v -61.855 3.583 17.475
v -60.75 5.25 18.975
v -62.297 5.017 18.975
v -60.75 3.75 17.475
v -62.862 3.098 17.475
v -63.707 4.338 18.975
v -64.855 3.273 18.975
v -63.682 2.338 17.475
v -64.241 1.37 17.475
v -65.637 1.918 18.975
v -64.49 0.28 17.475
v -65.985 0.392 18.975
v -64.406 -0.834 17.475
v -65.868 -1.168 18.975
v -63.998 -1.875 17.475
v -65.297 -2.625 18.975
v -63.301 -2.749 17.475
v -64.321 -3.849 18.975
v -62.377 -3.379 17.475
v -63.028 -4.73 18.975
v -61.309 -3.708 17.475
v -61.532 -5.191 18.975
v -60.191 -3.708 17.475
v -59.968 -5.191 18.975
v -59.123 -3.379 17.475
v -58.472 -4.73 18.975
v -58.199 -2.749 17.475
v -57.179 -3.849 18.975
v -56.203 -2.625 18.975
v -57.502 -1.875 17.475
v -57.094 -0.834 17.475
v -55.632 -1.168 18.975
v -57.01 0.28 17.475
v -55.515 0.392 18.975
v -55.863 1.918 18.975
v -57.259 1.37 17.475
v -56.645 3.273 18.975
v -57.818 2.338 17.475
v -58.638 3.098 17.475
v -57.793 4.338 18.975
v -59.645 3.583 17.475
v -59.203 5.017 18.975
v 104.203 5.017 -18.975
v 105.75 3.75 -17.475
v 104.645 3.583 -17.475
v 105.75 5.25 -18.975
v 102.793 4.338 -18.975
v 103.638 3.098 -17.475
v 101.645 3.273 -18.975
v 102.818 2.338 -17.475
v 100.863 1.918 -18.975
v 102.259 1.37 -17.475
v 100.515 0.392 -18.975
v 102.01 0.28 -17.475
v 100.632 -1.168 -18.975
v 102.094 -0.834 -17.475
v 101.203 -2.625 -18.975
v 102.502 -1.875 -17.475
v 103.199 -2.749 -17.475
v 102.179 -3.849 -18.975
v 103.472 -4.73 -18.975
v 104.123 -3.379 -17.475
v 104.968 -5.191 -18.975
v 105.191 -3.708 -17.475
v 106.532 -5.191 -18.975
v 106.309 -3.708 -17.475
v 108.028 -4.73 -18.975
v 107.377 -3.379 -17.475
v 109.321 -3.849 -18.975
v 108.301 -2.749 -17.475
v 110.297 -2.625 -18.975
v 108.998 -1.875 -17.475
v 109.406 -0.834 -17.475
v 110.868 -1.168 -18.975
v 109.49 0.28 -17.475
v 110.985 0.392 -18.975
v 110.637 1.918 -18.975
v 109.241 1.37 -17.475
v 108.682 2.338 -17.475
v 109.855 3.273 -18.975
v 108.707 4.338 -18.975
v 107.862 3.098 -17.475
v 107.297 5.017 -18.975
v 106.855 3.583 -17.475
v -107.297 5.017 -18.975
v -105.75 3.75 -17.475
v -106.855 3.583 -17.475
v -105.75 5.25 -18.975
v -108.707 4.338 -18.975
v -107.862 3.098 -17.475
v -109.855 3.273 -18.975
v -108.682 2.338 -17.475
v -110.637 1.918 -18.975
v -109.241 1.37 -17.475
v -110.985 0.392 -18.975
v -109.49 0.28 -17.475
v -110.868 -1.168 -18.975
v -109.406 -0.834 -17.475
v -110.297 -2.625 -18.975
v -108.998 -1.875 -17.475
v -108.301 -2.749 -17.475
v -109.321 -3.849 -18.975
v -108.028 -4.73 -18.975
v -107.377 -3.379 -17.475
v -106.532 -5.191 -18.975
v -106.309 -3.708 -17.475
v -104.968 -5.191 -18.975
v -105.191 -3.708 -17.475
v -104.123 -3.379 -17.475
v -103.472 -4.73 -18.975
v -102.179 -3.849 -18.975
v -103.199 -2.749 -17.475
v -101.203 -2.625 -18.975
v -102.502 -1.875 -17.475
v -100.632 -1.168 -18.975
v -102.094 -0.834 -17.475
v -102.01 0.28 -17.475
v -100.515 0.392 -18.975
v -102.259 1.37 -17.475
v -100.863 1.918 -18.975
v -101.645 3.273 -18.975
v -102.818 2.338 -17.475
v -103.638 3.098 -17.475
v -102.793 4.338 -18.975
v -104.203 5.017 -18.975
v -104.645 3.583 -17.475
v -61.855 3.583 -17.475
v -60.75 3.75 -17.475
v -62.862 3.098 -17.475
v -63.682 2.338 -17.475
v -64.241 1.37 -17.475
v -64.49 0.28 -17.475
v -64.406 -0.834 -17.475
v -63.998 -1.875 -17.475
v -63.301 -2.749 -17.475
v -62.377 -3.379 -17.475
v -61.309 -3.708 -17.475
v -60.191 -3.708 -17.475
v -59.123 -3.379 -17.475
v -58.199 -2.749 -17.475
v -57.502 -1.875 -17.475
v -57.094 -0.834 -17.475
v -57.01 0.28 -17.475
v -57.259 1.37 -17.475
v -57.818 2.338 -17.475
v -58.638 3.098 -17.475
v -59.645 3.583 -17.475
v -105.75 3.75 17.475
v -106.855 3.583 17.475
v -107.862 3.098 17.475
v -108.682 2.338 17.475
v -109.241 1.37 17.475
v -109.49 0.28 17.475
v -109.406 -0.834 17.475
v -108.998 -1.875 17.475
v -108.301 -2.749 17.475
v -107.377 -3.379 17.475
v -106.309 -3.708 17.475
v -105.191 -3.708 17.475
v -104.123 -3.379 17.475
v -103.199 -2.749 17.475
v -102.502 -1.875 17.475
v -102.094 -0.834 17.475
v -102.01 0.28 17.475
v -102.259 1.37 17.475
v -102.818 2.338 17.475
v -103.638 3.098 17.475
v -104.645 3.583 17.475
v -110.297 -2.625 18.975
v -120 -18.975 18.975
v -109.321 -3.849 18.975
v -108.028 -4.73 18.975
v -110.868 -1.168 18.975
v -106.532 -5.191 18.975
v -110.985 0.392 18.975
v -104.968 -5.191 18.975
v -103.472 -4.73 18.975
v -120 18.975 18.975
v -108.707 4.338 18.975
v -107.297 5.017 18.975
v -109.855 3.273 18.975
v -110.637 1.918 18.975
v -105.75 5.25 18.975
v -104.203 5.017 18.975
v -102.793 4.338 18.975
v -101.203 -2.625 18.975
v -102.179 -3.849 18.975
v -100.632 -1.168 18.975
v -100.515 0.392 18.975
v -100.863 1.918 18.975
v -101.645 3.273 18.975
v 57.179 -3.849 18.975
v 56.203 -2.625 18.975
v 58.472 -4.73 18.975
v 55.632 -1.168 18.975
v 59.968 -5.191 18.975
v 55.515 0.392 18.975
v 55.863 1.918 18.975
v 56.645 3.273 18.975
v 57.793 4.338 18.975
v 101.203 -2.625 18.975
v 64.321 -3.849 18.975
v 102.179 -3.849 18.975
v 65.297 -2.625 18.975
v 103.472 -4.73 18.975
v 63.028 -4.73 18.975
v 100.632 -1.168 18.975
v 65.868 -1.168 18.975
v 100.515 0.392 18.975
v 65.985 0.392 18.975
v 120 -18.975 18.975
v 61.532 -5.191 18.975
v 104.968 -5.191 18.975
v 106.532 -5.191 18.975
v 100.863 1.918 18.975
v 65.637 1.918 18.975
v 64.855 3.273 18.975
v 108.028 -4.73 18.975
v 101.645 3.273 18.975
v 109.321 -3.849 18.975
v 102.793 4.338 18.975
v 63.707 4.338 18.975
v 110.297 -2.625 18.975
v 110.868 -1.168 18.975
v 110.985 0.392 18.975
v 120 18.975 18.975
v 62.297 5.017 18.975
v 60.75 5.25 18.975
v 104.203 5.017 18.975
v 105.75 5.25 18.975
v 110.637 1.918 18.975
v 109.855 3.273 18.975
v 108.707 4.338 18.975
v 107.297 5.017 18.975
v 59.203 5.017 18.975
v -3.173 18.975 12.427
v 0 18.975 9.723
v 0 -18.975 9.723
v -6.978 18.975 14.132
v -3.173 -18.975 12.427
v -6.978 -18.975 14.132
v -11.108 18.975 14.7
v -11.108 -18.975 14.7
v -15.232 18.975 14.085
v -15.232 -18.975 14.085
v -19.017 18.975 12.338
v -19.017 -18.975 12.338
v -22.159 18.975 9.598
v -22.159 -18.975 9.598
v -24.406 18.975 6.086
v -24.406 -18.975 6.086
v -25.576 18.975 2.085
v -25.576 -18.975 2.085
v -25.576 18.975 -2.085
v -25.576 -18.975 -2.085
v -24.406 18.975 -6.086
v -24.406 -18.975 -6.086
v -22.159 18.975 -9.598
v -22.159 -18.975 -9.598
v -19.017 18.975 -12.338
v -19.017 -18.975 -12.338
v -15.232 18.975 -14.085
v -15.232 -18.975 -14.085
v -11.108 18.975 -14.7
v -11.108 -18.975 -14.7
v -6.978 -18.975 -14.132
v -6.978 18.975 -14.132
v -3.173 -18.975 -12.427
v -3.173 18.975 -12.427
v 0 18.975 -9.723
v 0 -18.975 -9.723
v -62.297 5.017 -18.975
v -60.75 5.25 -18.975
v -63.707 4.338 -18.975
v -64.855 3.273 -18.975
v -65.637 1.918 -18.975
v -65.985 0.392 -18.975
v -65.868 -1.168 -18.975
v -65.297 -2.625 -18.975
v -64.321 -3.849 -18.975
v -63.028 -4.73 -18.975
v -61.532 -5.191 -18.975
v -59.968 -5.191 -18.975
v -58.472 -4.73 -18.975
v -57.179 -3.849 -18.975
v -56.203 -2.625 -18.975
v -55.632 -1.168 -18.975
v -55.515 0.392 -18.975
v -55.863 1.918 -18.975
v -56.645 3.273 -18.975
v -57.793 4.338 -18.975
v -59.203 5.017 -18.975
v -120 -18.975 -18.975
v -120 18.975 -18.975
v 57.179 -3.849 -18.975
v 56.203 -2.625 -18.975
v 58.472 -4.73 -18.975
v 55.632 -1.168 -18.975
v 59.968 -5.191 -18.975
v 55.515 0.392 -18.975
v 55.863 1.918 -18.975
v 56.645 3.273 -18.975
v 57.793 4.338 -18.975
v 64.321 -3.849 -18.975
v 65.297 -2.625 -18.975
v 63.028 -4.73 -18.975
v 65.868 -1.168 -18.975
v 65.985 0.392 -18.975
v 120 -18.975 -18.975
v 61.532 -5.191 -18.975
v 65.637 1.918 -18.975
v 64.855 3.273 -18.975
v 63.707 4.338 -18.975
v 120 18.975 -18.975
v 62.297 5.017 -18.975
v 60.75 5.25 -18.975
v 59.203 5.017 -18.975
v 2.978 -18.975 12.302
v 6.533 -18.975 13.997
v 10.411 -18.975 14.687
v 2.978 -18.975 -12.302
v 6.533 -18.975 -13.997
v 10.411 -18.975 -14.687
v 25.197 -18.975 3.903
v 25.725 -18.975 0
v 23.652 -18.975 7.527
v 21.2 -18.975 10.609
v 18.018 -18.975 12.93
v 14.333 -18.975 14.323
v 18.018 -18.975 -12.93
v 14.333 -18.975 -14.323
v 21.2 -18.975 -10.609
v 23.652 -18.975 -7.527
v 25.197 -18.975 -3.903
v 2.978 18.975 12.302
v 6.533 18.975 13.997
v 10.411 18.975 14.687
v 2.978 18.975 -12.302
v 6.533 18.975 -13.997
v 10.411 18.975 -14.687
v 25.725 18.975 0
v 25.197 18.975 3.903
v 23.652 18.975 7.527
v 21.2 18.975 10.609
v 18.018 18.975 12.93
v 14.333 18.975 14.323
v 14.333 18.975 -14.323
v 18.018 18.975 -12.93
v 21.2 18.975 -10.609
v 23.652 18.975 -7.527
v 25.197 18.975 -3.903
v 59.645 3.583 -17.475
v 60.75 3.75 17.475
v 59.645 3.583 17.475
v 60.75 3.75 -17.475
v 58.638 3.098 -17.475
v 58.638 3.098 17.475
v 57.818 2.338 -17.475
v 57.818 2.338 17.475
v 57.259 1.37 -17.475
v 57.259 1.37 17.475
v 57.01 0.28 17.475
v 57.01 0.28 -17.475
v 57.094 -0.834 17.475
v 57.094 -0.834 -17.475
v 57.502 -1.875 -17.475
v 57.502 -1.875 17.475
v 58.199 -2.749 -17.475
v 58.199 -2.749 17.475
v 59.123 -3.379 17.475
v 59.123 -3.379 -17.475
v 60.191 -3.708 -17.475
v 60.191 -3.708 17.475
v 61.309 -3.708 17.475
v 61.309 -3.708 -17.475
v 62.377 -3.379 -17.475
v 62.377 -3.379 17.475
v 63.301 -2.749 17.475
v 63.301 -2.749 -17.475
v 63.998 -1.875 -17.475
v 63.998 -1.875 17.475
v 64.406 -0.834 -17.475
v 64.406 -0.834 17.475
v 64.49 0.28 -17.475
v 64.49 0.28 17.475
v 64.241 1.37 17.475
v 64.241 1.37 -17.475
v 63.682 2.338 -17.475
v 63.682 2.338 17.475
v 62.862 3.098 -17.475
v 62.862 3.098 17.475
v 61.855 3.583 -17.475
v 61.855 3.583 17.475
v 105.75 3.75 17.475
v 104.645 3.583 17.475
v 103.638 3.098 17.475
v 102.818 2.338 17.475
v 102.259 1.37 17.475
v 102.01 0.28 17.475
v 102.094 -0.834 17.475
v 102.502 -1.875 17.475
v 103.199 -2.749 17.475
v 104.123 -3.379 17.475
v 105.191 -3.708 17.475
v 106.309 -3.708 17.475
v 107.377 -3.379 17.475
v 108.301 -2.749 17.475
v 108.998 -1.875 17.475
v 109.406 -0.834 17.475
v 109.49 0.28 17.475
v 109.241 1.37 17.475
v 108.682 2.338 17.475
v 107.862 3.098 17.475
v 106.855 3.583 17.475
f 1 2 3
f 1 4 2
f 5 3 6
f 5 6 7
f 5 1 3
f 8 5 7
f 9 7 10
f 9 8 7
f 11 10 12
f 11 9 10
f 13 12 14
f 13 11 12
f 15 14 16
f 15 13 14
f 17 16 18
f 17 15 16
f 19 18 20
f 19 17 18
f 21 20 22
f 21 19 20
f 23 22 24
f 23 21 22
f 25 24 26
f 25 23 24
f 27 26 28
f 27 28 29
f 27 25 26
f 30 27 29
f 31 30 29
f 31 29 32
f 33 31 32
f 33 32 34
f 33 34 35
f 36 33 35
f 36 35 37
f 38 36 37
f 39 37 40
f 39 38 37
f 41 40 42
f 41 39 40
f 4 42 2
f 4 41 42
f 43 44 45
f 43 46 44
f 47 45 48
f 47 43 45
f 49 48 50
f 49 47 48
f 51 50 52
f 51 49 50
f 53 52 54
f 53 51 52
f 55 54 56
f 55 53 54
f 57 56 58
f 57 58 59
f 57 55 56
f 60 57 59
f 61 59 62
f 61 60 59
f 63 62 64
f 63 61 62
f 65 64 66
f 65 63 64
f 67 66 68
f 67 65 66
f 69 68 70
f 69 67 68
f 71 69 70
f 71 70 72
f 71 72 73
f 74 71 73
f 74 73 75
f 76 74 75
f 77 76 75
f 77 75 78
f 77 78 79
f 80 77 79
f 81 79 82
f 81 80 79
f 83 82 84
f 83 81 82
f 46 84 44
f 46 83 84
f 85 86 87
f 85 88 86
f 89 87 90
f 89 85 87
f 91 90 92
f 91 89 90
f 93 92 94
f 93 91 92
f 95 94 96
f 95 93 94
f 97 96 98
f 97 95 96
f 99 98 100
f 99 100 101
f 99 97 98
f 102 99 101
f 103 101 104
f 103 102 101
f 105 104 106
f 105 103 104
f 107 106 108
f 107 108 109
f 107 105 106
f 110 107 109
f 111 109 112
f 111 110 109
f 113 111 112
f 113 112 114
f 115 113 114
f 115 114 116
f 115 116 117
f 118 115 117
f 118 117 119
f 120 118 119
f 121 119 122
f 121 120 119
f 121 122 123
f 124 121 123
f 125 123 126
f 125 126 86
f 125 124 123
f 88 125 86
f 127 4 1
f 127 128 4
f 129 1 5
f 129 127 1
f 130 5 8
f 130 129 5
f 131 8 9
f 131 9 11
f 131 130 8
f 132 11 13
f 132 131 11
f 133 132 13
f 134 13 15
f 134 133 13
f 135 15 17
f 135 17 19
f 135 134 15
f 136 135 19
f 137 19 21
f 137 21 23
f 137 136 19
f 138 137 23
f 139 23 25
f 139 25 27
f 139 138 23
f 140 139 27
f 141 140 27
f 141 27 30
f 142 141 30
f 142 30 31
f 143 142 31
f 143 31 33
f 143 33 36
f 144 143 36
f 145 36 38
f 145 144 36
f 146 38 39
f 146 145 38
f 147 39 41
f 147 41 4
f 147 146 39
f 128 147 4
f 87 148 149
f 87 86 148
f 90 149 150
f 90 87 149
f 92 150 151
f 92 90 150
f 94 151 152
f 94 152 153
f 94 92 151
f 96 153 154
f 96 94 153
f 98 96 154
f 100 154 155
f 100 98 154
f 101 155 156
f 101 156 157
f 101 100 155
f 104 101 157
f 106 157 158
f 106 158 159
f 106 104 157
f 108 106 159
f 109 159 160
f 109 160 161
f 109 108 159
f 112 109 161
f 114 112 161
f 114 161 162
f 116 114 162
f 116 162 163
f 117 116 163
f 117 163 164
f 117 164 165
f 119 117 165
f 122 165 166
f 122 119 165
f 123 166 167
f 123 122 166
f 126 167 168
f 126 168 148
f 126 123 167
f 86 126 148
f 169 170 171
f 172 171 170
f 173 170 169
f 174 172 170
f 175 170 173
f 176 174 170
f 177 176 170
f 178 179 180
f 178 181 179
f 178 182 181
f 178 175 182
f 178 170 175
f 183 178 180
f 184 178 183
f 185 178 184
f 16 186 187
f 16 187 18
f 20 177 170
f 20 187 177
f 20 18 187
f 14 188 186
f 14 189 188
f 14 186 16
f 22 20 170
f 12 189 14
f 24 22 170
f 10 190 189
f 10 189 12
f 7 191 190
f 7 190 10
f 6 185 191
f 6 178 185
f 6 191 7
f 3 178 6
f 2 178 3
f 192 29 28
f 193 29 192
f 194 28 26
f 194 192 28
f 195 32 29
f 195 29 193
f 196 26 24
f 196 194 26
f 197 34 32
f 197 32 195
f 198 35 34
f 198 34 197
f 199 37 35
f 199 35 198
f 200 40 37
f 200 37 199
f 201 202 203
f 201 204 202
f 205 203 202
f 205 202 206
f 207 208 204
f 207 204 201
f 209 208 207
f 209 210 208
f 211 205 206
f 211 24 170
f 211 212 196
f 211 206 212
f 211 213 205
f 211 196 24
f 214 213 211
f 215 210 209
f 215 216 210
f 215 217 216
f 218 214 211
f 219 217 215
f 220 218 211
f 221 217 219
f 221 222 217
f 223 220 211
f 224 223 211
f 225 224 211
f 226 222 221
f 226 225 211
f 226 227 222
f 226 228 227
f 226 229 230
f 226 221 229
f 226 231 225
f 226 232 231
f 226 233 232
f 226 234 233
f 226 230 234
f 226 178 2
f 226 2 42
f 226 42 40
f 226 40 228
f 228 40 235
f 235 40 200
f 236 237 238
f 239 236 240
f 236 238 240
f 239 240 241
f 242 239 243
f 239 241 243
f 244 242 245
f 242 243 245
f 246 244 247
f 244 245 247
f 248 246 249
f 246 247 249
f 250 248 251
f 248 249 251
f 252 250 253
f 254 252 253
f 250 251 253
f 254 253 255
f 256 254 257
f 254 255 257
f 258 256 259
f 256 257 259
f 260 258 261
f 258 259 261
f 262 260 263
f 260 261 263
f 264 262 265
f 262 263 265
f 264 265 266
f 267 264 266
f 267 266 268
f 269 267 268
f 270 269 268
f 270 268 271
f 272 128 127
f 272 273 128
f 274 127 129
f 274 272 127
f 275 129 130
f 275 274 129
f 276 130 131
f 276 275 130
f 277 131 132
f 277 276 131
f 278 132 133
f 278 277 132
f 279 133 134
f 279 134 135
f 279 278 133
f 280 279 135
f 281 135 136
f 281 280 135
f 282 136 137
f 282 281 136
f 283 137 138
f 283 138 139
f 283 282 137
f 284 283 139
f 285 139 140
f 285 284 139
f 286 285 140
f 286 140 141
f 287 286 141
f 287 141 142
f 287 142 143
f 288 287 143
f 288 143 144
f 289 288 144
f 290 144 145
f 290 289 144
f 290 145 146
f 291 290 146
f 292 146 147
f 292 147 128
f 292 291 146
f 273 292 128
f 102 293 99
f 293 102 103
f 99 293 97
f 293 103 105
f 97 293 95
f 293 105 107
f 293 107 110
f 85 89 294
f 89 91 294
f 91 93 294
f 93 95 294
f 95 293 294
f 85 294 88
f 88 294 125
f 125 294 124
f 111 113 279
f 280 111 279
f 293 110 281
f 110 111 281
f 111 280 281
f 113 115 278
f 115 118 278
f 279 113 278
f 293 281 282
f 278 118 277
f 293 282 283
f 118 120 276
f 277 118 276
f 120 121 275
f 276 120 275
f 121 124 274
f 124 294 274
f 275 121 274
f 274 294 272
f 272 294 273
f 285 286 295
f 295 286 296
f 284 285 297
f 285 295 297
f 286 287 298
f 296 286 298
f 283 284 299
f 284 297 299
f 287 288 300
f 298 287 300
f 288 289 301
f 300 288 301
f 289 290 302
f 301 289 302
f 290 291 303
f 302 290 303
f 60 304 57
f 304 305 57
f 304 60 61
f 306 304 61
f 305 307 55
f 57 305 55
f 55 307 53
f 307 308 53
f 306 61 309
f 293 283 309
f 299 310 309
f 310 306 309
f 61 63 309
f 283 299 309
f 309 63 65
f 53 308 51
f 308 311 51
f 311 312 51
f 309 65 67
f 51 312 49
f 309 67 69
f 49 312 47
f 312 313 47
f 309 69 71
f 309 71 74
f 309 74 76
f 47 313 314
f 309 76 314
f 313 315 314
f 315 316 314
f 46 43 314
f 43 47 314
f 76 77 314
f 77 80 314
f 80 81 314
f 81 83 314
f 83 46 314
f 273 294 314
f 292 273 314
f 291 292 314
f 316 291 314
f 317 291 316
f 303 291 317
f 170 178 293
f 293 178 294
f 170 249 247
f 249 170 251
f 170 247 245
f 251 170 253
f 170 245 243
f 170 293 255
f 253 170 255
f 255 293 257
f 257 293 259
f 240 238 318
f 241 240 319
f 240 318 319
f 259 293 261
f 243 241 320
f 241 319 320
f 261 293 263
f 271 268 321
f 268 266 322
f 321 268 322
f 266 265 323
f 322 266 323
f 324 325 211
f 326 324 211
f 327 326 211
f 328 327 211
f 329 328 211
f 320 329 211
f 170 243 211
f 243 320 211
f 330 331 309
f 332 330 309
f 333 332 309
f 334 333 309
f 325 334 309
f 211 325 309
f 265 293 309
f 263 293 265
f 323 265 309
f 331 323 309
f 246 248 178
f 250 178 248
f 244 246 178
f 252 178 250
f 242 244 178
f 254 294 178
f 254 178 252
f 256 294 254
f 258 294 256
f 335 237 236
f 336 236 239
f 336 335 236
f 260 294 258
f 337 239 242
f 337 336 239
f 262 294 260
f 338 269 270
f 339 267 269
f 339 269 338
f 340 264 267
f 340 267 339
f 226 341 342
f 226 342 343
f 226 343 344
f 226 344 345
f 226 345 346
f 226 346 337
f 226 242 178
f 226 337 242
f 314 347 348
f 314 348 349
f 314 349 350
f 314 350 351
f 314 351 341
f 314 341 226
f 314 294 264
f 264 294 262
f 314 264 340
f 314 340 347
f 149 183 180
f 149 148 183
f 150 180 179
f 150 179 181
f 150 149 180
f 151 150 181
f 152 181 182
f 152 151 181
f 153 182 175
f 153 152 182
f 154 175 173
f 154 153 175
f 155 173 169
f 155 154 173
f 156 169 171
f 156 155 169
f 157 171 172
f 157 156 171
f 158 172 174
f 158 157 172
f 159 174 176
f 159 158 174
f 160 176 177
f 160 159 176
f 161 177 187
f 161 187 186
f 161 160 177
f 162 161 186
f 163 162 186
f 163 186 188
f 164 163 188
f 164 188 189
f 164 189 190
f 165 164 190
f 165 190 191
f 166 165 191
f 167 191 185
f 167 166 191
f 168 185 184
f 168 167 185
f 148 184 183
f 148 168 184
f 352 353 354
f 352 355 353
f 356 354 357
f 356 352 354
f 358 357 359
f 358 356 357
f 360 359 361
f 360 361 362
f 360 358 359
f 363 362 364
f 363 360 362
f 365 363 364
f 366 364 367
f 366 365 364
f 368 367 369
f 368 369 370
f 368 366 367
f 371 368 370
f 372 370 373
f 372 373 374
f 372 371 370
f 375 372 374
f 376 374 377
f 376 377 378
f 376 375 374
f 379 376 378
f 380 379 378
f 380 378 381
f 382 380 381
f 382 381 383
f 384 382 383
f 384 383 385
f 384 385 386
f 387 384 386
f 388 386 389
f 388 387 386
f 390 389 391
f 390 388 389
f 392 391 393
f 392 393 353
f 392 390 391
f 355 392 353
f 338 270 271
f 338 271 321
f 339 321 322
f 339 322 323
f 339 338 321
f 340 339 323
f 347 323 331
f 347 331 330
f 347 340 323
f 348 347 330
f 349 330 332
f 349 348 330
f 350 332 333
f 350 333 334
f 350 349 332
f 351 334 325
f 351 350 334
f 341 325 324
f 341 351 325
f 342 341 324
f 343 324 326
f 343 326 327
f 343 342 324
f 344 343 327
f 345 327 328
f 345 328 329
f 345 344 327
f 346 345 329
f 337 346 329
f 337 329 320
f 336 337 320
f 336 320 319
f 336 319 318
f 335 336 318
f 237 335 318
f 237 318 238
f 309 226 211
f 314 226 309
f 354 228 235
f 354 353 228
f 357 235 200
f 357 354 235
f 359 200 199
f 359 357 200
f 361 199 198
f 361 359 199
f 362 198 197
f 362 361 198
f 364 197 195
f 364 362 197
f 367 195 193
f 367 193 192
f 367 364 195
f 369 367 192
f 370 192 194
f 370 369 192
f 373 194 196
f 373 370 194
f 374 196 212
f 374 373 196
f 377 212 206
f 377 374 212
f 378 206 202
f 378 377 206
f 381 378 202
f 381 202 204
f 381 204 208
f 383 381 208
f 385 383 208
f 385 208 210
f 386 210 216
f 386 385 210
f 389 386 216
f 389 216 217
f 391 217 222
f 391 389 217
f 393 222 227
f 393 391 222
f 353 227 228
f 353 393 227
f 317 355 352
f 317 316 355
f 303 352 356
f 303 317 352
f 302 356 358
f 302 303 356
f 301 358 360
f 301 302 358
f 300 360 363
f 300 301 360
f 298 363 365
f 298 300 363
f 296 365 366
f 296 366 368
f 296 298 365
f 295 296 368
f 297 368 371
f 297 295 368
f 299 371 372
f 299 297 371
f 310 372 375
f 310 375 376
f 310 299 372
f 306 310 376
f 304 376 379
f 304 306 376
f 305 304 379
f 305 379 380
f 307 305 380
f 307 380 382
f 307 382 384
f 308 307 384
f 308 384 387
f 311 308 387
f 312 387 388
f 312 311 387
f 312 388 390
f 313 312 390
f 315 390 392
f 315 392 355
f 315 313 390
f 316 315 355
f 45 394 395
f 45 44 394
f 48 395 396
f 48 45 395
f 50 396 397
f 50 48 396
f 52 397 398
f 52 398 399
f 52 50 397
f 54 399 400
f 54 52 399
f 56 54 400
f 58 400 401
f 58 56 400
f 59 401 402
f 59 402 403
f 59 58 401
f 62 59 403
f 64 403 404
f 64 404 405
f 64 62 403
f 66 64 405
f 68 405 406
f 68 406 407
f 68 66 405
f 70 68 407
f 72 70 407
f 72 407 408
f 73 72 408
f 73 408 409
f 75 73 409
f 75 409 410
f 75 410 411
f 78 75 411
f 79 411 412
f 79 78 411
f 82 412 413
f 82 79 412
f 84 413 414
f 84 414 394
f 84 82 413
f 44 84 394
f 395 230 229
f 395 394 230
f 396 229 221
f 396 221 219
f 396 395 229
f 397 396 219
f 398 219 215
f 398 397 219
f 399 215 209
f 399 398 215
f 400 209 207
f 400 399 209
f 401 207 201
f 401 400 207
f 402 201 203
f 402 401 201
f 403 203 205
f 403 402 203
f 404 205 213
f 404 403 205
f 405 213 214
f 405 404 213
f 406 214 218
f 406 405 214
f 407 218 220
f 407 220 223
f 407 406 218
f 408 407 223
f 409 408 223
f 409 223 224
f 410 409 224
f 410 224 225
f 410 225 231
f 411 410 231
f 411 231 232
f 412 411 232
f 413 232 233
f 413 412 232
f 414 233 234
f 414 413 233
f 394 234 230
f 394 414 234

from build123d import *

# Parameters (mm, degrees)
SKETCH1_W                  = 80
SKETCH1_H                  = 12.65
BOSS_EXTRUDE1_DEPTH        = 6.325
M3_TAPPED_HOLE1_AT_2_COUNT = 2
M3_TAPPED_HOLE1_AT_2_PITCH = 15
M3_TAPPED_HOLE1_AT_3_COUNT = 2
M3_TAPPED_HOLE1_AT_3_PITCH = 55.5
M3_TAPPED_HOLE1_AT_4_COUNT = 2
M3_TAPPED_HOLE1_AT_4_PITCH = 70.5
SCALE1_SCALE               = 3


with BuildPart() as part:
    # Sketch1 → Boss-Extrude1 (new, symmetric)
    with BuildSketch(Plane(origin=(0, 0, 0), x_dir=(1, 0, 0), z_dir=(0, 1, 0))):
        Rectangle(SKETCH1_W, SKETCH1_H)
        with BuildLine():
            ThreePointArc((0, -3.241045356), (-8.575, 0), (0, 3.241045356))
            ThreePointArc((0, 3.241045356), (5.407411614, 4.583530299), (8.575, 0))
            ThreePointArc((8.575, 0), (5.407411614, -4.583530299), (0, -3.241045356))
        make_face(mode=Mode.SUBTRACT)
    extrude(amount=BOSS_EXTRUDE1_DEPTH, both=True)

    # Sketch5 → M3 Tapped Hole1 (revolve, cut)
    with BuildSketch(Plane(origin=(-35.25, 0, -6.325), x_dir=(0, 1, 0), z_dir=(1, 0, 0))):
        Polygon((0, 0), (0, 12.65), (1.75, 12.65), (1.25, 12.15), (1.25, 0.5), (1.75, 0), align=None)
    m3_tapped_hole1 = revolve(axis=Axis((-35.25, 0, -12.675), (0, 0, 1)), mode=Mode.SUBTRACT)

    # M3 Tapped Hole1 at 2: M3 Tapped Hole1 ×2
    with Locations(*[(i * M3_TAPPED_HOLE1_AT_2_PITCH, 0, 0) for i in range(1, M3_TAPPED_HOLE1_AT_2_COUNT)]):
        add(m3_tapped_hole1, mode=Mode.SUBTRACT)

    # M3 Tapped Hole1 at 3: M3 Tapped Hole1 ×2
    with Locations(*[(i * M3_TAPPED_HOLE1_AT_3_PITCH, 0, 0) for i in range(1, M3_TAPPED_HOLE1_AT_3_COUNT)]):
        add(m3_tapped_hole1, mode=Mode.SUBTRACT)

    # M3 Tapped Hole1 at 4: M3 Tapped Hole1 ×2
    with Locations(*[(i * M3_TAPPED_HOLE1_AT_4_PITCH, 0, 0) for i in range(1, M3_TAPPED_HOLE1_AT_4_COUNT)]):
        add(m3_tapped_hole1, mode=Mode.SUBTRACT)


with BuildPart() as part_1:
    # Scale1: scaled about (0, 0, 0)
    add(part.part.scale(SCALE1_SCALE))


solid = part_1.part
